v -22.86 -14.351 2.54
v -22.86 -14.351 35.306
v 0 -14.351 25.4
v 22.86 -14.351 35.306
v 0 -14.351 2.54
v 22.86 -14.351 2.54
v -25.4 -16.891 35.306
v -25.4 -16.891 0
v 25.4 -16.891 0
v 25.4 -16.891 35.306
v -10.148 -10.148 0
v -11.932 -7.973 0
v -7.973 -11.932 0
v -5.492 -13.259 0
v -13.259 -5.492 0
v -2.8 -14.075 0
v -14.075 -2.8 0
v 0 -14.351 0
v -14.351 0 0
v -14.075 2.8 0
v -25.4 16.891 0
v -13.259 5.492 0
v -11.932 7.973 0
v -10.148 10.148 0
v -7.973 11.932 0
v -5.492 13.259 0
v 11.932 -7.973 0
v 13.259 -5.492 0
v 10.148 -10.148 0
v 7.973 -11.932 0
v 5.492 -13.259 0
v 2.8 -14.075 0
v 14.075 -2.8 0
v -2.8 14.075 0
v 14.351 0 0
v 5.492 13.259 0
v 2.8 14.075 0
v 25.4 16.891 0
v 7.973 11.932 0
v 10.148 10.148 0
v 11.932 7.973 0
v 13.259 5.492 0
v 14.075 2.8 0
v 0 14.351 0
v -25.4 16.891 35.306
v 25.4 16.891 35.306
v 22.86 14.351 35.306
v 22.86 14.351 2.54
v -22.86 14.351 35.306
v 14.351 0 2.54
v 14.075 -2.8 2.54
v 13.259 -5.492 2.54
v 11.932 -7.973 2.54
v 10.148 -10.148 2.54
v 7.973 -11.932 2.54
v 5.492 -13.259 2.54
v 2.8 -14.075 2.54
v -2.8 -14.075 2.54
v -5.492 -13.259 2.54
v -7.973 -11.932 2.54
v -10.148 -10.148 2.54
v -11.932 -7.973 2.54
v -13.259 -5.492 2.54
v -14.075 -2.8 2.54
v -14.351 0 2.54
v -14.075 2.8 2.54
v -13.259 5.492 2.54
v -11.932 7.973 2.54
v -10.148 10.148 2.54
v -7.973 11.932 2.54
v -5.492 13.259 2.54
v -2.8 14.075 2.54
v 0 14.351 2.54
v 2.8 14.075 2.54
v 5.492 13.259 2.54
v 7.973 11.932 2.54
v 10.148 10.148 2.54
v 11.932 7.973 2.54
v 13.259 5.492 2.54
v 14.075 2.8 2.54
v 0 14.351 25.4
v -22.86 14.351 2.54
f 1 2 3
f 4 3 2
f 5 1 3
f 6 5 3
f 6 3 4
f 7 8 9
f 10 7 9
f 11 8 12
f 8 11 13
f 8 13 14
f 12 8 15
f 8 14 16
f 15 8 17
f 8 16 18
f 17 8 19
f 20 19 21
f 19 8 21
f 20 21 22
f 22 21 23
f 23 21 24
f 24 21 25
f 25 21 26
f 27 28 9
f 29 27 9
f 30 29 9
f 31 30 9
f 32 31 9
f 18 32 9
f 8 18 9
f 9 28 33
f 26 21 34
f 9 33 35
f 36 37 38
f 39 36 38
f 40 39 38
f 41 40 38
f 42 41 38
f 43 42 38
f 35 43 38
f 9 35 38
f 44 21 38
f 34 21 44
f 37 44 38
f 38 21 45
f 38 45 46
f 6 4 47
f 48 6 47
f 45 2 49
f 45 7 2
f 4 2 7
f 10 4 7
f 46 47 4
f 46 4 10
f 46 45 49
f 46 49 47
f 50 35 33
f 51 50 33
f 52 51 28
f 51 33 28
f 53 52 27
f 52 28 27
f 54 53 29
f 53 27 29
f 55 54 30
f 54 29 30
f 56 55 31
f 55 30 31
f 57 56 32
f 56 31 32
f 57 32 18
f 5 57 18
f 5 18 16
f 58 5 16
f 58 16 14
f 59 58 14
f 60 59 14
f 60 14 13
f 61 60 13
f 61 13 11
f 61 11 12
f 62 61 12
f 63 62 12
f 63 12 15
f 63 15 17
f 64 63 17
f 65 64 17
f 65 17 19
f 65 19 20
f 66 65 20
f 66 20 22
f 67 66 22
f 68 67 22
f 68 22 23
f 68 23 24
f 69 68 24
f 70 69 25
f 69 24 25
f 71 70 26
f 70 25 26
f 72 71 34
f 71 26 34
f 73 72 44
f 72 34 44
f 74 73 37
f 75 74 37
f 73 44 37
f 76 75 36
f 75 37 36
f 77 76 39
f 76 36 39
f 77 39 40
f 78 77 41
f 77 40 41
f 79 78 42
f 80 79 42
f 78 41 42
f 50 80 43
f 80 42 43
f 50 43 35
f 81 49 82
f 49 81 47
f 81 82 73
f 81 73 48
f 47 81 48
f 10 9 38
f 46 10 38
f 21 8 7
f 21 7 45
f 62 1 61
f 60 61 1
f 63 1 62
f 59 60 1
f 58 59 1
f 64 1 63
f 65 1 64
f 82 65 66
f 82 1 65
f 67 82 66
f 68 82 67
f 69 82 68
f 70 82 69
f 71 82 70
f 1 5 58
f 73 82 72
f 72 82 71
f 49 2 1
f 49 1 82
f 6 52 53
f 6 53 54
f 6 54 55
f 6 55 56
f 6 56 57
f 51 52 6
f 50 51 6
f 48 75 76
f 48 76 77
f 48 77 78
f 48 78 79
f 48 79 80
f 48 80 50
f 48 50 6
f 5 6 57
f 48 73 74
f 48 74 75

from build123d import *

# Parameters (mm, degrees)
F0_W     = 50.8
F0_H     = 33.782
F1_DEPTH = 35.306
F2_T     = -2.54
F3_R     = 14.351
F4_DEPTH = 25.4


with BuildPart() as f1:
    # F0 (on Top) → F1 (new body)
    with BuildSketch(Plane.XY):
        Rectangle(F0_W, F0_H)
    extrude(amount=F1_DEPTH)

    # F2
    f2_openings = [f1.faces().sort_by_distance(p)[0] for p in [
        (0, 0, 35.306),
    ]]
    offset(amount=F2_T, openings=f2_openings)

    # F3 (on face) → F4 (cut)
    with BuildSketch(Plane(origin=(0, 0, 0), x_dir=(1, 0, 0), z_dir=(0, 0, -1))):
        Circle(F3_R)
    extrude(amount=-F4_DEPTH, mode=Mode.SUBTRACT)


solid = f1.part
